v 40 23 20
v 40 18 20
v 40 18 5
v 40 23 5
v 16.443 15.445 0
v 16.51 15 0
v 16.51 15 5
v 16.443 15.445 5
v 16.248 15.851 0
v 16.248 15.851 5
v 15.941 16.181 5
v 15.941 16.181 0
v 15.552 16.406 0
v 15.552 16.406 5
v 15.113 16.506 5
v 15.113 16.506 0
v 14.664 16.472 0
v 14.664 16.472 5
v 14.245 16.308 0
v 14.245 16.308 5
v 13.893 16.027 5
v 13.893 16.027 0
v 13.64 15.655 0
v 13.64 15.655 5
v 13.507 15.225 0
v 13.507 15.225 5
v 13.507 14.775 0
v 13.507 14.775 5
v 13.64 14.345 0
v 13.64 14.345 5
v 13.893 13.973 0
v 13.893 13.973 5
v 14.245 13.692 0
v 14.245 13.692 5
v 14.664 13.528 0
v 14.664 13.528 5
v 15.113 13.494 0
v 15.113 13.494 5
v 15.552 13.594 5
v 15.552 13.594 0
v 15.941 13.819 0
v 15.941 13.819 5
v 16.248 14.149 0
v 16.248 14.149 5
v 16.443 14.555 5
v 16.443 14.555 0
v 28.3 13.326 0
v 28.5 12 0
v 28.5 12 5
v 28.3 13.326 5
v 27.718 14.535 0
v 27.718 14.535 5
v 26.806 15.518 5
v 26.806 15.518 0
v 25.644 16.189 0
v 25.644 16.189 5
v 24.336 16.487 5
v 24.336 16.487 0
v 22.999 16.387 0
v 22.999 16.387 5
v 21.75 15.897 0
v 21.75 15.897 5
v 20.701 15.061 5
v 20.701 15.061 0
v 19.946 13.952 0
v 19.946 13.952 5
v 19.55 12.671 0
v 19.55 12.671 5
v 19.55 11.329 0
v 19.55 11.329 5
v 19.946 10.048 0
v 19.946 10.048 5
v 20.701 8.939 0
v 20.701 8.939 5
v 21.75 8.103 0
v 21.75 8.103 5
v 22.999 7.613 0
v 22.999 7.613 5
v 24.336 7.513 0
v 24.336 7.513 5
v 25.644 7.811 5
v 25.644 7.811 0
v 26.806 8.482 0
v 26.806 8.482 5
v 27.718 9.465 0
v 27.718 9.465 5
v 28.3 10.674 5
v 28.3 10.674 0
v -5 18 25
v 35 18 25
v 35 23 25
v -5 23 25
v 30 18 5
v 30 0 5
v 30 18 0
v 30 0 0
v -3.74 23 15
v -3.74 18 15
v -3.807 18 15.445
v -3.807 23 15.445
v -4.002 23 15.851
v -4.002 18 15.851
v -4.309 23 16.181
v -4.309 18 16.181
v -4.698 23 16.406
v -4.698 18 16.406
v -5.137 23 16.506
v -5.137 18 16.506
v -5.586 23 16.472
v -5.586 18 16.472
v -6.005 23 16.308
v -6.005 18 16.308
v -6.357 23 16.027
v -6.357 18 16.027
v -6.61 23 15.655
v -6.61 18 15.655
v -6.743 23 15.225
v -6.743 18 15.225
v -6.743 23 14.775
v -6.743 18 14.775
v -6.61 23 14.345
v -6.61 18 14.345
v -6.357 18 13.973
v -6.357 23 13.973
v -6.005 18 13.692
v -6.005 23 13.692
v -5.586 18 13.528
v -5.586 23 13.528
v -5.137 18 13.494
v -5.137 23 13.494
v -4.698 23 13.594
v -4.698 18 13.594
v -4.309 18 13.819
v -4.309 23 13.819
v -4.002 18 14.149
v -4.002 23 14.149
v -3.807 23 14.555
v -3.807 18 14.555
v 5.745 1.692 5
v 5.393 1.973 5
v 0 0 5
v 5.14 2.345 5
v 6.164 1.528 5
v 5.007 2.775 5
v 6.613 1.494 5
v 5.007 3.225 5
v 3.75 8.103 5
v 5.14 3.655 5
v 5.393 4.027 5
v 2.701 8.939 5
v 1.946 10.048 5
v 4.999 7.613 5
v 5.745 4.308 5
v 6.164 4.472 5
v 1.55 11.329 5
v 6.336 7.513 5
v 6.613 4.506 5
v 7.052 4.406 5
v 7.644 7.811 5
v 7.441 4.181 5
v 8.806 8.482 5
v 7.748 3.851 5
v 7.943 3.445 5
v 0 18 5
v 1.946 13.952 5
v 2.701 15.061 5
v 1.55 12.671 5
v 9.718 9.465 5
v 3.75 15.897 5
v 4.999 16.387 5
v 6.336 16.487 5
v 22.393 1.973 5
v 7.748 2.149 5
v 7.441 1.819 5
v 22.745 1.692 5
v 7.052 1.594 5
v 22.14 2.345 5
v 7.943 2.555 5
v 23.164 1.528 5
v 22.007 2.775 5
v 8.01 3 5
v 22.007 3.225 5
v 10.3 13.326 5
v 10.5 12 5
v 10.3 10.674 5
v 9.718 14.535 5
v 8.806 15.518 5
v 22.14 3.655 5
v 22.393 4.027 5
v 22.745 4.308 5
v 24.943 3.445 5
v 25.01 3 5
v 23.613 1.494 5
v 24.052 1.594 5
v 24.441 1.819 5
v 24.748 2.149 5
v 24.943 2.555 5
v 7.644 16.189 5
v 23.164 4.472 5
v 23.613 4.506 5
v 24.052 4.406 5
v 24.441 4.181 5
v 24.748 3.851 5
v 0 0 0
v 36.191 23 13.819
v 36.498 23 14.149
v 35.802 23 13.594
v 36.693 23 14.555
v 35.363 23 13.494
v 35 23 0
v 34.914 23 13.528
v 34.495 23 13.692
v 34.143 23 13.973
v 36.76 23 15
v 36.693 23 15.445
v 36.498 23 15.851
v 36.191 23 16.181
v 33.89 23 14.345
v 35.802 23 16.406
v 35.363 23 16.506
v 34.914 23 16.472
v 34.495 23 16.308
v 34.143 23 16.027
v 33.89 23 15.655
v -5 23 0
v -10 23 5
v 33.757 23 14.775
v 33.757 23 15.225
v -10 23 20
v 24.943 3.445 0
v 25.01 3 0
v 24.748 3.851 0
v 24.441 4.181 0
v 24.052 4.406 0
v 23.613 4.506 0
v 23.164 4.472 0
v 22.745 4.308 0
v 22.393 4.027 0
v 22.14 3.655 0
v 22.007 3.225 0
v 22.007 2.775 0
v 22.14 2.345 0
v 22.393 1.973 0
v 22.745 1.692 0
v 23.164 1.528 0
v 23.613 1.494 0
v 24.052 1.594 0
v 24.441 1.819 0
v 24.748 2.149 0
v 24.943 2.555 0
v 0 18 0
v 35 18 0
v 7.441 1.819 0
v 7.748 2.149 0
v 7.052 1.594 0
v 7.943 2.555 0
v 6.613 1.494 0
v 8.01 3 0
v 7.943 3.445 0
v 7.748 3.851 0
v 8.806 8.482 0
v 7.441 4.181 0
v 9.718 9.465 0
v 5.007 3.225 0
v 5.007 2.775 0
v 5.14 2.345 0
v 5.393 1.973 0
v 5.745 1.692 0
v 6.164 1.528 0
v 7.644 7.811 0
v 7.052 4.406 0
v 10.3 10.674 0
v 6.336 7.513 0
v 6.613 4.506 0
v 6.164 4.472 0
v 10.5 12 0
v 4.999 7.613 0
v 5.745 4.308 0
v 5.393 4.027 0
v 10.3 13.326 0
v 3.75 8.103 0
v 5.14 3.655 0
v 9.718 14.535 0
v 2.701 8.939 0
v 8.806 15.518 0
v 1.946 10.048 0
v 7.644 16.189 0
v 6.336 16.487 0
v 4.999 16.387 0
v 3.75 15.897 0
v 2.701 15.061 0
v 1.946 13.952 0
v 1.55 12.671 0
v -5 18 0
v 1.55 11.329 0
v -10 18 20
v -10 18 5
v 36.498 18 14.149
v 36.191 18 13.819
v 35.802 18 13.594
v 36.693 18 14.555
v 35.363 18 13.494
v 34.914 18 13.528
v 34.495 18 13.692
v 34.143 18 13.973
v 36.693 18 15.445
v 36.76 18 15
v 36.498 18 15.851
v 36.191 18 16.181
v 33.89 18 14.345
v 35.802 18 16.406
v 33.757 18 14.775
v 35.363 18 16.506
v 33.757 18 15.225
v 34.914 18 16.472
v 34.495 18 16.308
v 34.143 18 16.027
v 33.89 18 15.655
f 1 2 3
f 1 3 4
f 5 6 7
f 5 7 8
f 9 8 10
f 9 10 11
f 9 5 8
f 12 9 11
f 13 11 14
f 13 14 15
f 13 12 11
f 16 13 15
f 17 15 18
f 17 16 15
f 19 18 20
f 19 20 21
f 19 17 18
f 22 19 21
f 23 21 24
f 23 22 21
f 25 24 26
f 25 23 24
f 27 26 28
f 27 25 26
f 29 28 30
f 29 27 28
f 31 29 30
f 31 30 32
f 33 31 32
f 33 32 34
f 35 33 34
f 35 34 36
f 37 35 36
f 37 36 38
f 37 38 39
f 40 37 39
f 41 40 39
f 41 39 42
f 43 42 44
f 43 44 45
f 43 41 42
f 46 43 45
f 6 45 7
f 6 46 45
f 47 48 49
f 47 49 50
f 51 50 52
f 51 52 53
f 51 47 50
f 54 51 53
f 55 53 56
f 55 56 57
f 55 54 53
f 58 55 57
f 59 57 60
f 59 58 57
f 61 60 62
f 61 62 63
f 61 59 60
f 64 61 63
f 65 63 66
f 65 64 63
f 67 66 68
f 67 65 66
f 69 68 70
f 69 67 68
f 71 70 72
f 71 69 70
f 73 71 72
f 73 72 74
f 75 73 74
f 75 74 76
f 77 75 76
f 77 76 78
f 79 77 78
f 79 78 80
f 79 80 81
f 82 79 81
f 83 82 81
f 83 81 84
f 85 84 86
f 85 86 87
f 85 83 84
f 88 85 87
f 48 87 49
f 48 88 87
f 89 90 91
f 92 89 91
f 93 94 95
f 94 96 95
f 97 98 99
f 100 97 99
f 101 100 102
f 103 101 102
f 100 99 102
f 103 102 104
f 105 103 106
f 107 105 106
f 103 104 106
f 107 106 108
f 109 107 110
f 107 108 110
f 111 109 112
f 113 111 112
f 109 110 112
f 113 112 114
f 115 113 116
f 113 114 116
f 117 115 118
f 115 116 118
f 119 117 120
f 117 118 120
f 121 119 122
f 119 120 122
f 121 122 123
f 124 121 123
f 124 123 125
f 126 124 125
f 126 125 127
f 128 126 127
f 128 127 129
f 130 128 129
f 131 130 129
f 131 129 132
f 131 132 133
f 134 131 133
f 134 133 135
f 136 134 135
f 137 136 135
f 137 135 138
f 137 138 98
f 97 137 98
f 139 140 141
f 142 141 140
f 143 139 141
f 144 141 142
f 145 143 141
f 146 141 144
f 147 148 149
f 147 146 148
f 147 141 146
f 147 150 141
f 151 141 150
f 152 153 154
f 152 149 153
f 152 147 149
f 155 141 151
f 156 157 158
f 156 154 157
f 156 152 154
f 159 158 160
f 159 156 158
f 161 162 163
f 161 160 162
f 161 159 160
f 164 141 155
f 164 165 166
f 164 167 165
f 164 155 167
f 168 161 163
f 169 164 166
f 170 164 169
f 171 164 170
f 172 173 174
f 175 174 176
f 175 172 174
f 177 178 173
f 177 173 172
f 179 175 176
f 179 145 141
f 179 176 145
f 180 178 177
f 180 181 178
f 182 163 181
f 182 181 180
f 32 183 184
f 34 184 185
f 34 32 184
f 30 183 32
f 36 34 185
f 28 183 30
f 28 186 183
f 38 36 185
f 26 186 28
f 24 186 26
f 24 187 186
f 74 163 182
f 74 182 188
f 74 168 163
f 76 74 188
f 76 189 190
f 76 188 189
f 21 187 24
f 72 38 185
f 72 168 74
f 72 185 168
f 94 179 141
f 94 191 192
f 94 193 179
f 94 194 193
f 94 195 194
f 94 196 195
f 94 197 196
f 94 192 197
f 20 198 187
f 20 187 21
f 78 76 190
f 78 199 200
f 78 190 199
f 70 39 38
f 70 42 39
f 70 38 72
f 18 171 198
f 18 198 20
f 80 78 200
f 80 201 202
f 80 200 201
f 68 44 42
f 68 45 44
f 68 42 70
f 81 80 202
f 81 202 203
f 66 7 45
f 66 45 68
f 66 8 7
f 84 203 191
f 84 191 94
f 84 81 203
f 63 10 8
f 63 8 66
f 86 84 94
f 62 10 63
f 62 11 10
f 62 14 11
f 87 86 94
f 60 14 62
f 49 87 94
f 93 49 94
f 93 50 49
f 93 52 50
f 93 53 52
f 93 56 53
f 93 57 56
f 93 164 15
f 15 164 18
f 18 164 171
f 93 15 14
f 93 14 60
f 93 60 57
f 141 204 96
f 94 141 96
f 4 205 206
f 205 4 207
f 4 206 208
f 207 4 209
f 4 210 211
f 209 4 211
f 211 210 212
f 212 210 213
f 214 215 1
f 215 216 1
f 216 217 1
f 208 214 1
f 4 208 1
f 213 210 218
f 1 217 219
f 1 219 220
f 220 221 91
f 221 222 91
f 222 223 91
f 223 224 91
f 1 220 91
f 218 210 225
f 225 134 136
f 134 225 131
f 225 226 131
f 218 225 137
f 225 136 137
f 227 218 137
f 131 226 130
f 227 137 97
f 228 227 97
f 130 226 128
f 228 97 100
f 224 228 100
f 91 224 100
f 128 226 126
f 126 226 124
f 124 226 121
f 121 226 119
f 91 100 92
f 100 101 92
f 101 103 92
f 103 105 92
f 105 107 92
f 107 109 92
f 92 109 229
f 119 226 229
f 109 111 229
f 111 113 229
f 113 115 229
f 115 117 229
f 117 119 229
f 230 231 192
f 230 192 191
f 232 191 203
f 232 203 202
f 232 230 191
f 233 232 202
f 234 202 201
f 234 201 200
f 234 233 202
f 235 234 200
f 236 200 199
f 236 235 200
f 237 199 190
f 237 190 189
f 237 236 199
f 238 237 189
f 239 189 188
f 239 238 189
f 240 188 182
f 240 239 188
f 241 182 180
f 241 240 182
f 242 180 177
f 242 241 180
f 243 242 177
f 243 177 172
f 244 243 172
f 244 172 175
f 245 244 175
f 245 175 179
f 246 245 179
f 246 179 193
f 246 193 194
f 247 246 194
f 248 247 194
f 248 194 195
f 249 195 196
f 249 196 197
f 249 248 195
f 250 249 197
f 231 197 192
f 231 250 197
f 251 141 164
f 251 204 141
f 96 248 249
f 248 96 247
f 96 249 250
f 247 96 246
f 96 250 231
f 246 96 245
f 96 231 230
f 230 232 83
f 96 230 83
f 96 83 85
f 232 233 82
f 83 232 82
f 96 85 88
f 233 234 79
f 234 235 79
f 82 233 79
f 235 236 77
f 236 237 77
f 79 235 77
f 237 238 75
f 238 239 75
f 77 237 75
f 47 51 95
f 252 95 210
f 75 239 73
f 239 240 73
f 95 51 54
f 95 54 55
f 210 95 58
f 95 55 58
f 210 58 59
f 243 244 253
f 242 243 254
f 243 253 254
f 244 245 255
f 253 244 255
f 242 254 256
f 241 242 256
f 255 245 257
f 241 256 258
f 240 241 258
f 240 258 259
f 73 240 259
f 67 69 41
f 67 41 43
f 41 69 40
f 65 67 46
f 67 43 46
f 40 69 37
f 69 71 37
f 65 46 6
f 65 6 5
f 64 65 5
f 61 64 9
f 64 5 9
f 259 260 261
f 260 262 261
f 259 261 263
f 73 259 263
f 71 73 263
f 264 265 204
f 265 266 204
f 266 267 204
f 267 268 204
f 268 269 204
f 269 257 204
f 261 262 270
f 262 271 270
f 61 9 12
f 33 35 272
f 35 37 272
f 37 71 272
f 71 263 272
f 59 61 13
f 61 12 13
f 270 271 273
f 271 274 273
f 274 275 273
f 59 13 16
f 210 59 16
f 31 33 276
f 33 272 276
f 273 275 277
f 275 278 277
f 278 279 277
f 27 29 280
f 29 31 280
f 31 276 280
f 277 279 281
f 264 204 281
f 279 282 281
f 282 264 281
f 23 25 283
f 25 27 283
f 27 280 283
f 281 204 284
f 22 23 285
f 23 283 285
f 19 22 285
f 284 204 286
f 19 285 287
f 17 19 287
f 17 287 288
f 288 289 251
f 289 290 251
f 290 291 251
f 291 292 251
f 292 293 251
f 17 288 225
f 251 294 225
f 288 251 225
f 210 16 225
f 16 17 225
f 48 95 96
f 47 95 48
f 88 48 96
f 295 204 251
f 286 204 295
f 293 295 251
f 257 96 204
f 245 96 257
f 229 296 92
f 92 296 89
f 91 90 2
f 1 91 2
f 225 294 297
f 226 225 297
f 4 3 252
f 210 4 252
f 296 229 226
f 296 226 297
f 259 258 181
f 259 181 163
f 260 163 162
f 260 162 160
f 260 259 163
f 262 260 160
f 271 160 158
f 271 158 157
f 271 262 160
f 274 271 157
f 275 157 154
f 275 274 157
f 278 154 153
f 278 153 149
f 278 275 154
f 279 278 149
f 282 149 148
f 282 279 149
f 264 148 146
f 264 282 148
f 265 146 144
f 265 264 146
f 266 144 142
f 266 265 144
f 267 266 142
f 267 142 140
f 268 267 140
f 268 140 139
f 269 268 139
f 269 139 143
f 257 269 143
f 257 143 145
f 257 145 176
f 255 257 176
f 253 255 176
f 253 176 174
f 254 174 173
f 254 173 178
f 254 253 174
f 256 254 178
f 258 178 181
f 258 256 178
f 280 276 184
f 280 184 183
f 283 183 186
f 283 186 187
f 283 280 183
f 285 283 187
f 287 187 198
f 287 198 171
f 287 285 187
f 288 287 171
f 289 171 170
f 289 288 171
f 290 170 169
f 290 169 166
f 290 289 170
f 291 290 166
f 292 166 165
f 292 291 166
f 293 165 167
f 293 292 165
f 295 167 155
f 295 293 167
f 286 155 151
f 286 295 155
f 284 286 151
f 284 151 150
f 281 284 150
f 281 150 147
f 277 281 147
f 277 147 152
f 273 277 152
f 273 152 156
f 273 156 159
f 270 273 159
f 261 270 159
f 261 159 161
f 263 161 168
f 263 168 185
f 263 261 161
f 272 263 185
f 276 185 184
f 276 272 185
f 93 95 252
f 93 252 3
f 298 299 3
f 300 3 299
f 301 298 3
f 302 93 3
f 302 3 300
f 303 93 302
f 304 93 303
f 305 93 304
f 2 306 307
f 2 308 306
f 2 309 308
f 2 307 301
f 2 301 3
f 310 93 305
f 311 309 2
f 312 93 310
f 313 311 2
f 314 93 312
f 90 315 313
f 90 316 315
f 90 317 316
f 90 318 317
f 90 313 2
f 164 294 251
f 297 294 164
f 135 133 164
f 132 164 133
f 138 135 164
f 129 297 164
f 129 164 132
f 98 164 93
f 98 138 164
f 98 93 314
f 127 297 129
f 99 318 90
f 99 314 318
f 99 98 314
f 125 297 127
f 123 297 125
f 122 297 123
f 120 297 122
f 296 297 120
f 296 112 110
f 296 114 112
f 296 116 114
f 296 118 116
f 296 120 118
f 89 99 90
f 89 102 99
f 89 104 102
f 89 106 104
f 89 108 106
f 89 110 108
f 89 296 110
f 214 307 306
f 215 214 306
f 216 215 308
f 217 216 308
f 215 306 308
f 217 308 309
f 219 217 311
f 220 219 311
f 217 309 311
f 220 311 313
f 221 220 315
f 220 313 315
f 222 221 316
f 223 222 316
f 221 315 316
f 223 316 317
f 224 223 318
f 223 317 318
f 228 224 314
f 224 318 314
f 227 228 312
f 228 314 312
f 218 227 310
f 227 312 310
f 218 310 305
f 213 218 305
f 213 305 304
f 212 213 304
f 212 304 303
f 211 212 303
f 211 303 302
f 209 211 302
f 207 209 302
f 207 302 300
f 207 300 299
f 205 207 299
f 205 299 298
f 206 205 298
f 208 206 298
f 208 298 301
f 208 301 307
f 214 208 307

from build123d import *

# Parameters (mm, degrees)
F0_R      = 1.51
F0_R_2    = 4.5
F1_DEPTH  = 5
F2_W      = 30
F2_H      = 5
F3_DEPTH  = 20
F4_W      = 5
F4_H      = 25
F5_DEPTH  = 10
F6_W      = 5
F6_H      = 25
F7_DEPTH  = 10
F9_DEPTH  = 5.001
F10_R     = 1.51
F11_DEPTH = 5.001


with BuildPart() as f1:
    # F0 (on Top) → F1 (new body)
    with BuildSketch(Plane.XY):
        Polygon((0, 18), (0, 0), (30, 0), (30, 18), (30, 23), (29.759806, 23), (0, 23), align=None)
        with Locations((6.5, 3)):
            Circle(F0_R, mode=Mode.SUBTRACT)
        with Locations((23.5, 3)):
            Circle(F0_R, mode=Mode.SUBTRACT)
        with Locations((6, 12)):
            Circle(F0_R_2, mode=Mode.SUBTRACT)
        with Locations((15, 15)):
            Circle(F0_R, mode=Mode.SUBTRACT)
        with Locations((24, 12)):
            Circle(F0_R_2, mode=Mode.SUBTRACT)
    extrude(amount=F1_DEPTH)

    # F2 (on face) → F3 (join)
    with BuildSketch(Plane.XY.offset(5)):
        with Locations((15, 20.5)):
            Rectangle(F2_W, F2_H)
    extrude(amount=F3_DEPTH)

    # F4 (on face) → F5 (join)
    with BuildSketch(Plane(origin=(0, 0, 0), x_dir=(0, -1, 0), z_dir=(-1, 0, 0))):
        with Locations((-20.5, 12.5)):
            Rectangle(F4_W, F4_H)
    extrude(amount=F5_DEPTH)

    # F6 (on face) → F7 (join)
    with BuildSketch(Plane.YZ.offset(30)):
        with Locations((20.5, 12.5)):
            Rectangle(F6_W, F6_H)
    extrude(amount=F7_DEPTH)

    # F8 (on face) → F9 (cut, through all)
    with BuildSketch(Plane.XZ.offset(-18)):
        Polygon((-5, 25), (-10, 25), (-10, 20), align=None)
        Polygon((-5, 0), (-10, 5), (-10, 0), align=None)
        Polygon((40, 5), (35, 0), (40, 0), align=None)
        Polygon((40, 25), (35, 25), (40, 20), align=None)
    extrude(amount=-F9_DEPTH, mode=Mode.SUBTRACT)

    # F10 (on face) → F11 (cut, through all)
    with BuildSketch(Plane.XZ.offset(-18)):
        with Locations((-5.25, 15)):
            Circle(F10_R)
        with Locations((35.25, 15)):
            Circle(F10_R)
    extrude(amount=-F11_DEPTH, mode=Mode.SUBTRACT)


solid = f1.part
